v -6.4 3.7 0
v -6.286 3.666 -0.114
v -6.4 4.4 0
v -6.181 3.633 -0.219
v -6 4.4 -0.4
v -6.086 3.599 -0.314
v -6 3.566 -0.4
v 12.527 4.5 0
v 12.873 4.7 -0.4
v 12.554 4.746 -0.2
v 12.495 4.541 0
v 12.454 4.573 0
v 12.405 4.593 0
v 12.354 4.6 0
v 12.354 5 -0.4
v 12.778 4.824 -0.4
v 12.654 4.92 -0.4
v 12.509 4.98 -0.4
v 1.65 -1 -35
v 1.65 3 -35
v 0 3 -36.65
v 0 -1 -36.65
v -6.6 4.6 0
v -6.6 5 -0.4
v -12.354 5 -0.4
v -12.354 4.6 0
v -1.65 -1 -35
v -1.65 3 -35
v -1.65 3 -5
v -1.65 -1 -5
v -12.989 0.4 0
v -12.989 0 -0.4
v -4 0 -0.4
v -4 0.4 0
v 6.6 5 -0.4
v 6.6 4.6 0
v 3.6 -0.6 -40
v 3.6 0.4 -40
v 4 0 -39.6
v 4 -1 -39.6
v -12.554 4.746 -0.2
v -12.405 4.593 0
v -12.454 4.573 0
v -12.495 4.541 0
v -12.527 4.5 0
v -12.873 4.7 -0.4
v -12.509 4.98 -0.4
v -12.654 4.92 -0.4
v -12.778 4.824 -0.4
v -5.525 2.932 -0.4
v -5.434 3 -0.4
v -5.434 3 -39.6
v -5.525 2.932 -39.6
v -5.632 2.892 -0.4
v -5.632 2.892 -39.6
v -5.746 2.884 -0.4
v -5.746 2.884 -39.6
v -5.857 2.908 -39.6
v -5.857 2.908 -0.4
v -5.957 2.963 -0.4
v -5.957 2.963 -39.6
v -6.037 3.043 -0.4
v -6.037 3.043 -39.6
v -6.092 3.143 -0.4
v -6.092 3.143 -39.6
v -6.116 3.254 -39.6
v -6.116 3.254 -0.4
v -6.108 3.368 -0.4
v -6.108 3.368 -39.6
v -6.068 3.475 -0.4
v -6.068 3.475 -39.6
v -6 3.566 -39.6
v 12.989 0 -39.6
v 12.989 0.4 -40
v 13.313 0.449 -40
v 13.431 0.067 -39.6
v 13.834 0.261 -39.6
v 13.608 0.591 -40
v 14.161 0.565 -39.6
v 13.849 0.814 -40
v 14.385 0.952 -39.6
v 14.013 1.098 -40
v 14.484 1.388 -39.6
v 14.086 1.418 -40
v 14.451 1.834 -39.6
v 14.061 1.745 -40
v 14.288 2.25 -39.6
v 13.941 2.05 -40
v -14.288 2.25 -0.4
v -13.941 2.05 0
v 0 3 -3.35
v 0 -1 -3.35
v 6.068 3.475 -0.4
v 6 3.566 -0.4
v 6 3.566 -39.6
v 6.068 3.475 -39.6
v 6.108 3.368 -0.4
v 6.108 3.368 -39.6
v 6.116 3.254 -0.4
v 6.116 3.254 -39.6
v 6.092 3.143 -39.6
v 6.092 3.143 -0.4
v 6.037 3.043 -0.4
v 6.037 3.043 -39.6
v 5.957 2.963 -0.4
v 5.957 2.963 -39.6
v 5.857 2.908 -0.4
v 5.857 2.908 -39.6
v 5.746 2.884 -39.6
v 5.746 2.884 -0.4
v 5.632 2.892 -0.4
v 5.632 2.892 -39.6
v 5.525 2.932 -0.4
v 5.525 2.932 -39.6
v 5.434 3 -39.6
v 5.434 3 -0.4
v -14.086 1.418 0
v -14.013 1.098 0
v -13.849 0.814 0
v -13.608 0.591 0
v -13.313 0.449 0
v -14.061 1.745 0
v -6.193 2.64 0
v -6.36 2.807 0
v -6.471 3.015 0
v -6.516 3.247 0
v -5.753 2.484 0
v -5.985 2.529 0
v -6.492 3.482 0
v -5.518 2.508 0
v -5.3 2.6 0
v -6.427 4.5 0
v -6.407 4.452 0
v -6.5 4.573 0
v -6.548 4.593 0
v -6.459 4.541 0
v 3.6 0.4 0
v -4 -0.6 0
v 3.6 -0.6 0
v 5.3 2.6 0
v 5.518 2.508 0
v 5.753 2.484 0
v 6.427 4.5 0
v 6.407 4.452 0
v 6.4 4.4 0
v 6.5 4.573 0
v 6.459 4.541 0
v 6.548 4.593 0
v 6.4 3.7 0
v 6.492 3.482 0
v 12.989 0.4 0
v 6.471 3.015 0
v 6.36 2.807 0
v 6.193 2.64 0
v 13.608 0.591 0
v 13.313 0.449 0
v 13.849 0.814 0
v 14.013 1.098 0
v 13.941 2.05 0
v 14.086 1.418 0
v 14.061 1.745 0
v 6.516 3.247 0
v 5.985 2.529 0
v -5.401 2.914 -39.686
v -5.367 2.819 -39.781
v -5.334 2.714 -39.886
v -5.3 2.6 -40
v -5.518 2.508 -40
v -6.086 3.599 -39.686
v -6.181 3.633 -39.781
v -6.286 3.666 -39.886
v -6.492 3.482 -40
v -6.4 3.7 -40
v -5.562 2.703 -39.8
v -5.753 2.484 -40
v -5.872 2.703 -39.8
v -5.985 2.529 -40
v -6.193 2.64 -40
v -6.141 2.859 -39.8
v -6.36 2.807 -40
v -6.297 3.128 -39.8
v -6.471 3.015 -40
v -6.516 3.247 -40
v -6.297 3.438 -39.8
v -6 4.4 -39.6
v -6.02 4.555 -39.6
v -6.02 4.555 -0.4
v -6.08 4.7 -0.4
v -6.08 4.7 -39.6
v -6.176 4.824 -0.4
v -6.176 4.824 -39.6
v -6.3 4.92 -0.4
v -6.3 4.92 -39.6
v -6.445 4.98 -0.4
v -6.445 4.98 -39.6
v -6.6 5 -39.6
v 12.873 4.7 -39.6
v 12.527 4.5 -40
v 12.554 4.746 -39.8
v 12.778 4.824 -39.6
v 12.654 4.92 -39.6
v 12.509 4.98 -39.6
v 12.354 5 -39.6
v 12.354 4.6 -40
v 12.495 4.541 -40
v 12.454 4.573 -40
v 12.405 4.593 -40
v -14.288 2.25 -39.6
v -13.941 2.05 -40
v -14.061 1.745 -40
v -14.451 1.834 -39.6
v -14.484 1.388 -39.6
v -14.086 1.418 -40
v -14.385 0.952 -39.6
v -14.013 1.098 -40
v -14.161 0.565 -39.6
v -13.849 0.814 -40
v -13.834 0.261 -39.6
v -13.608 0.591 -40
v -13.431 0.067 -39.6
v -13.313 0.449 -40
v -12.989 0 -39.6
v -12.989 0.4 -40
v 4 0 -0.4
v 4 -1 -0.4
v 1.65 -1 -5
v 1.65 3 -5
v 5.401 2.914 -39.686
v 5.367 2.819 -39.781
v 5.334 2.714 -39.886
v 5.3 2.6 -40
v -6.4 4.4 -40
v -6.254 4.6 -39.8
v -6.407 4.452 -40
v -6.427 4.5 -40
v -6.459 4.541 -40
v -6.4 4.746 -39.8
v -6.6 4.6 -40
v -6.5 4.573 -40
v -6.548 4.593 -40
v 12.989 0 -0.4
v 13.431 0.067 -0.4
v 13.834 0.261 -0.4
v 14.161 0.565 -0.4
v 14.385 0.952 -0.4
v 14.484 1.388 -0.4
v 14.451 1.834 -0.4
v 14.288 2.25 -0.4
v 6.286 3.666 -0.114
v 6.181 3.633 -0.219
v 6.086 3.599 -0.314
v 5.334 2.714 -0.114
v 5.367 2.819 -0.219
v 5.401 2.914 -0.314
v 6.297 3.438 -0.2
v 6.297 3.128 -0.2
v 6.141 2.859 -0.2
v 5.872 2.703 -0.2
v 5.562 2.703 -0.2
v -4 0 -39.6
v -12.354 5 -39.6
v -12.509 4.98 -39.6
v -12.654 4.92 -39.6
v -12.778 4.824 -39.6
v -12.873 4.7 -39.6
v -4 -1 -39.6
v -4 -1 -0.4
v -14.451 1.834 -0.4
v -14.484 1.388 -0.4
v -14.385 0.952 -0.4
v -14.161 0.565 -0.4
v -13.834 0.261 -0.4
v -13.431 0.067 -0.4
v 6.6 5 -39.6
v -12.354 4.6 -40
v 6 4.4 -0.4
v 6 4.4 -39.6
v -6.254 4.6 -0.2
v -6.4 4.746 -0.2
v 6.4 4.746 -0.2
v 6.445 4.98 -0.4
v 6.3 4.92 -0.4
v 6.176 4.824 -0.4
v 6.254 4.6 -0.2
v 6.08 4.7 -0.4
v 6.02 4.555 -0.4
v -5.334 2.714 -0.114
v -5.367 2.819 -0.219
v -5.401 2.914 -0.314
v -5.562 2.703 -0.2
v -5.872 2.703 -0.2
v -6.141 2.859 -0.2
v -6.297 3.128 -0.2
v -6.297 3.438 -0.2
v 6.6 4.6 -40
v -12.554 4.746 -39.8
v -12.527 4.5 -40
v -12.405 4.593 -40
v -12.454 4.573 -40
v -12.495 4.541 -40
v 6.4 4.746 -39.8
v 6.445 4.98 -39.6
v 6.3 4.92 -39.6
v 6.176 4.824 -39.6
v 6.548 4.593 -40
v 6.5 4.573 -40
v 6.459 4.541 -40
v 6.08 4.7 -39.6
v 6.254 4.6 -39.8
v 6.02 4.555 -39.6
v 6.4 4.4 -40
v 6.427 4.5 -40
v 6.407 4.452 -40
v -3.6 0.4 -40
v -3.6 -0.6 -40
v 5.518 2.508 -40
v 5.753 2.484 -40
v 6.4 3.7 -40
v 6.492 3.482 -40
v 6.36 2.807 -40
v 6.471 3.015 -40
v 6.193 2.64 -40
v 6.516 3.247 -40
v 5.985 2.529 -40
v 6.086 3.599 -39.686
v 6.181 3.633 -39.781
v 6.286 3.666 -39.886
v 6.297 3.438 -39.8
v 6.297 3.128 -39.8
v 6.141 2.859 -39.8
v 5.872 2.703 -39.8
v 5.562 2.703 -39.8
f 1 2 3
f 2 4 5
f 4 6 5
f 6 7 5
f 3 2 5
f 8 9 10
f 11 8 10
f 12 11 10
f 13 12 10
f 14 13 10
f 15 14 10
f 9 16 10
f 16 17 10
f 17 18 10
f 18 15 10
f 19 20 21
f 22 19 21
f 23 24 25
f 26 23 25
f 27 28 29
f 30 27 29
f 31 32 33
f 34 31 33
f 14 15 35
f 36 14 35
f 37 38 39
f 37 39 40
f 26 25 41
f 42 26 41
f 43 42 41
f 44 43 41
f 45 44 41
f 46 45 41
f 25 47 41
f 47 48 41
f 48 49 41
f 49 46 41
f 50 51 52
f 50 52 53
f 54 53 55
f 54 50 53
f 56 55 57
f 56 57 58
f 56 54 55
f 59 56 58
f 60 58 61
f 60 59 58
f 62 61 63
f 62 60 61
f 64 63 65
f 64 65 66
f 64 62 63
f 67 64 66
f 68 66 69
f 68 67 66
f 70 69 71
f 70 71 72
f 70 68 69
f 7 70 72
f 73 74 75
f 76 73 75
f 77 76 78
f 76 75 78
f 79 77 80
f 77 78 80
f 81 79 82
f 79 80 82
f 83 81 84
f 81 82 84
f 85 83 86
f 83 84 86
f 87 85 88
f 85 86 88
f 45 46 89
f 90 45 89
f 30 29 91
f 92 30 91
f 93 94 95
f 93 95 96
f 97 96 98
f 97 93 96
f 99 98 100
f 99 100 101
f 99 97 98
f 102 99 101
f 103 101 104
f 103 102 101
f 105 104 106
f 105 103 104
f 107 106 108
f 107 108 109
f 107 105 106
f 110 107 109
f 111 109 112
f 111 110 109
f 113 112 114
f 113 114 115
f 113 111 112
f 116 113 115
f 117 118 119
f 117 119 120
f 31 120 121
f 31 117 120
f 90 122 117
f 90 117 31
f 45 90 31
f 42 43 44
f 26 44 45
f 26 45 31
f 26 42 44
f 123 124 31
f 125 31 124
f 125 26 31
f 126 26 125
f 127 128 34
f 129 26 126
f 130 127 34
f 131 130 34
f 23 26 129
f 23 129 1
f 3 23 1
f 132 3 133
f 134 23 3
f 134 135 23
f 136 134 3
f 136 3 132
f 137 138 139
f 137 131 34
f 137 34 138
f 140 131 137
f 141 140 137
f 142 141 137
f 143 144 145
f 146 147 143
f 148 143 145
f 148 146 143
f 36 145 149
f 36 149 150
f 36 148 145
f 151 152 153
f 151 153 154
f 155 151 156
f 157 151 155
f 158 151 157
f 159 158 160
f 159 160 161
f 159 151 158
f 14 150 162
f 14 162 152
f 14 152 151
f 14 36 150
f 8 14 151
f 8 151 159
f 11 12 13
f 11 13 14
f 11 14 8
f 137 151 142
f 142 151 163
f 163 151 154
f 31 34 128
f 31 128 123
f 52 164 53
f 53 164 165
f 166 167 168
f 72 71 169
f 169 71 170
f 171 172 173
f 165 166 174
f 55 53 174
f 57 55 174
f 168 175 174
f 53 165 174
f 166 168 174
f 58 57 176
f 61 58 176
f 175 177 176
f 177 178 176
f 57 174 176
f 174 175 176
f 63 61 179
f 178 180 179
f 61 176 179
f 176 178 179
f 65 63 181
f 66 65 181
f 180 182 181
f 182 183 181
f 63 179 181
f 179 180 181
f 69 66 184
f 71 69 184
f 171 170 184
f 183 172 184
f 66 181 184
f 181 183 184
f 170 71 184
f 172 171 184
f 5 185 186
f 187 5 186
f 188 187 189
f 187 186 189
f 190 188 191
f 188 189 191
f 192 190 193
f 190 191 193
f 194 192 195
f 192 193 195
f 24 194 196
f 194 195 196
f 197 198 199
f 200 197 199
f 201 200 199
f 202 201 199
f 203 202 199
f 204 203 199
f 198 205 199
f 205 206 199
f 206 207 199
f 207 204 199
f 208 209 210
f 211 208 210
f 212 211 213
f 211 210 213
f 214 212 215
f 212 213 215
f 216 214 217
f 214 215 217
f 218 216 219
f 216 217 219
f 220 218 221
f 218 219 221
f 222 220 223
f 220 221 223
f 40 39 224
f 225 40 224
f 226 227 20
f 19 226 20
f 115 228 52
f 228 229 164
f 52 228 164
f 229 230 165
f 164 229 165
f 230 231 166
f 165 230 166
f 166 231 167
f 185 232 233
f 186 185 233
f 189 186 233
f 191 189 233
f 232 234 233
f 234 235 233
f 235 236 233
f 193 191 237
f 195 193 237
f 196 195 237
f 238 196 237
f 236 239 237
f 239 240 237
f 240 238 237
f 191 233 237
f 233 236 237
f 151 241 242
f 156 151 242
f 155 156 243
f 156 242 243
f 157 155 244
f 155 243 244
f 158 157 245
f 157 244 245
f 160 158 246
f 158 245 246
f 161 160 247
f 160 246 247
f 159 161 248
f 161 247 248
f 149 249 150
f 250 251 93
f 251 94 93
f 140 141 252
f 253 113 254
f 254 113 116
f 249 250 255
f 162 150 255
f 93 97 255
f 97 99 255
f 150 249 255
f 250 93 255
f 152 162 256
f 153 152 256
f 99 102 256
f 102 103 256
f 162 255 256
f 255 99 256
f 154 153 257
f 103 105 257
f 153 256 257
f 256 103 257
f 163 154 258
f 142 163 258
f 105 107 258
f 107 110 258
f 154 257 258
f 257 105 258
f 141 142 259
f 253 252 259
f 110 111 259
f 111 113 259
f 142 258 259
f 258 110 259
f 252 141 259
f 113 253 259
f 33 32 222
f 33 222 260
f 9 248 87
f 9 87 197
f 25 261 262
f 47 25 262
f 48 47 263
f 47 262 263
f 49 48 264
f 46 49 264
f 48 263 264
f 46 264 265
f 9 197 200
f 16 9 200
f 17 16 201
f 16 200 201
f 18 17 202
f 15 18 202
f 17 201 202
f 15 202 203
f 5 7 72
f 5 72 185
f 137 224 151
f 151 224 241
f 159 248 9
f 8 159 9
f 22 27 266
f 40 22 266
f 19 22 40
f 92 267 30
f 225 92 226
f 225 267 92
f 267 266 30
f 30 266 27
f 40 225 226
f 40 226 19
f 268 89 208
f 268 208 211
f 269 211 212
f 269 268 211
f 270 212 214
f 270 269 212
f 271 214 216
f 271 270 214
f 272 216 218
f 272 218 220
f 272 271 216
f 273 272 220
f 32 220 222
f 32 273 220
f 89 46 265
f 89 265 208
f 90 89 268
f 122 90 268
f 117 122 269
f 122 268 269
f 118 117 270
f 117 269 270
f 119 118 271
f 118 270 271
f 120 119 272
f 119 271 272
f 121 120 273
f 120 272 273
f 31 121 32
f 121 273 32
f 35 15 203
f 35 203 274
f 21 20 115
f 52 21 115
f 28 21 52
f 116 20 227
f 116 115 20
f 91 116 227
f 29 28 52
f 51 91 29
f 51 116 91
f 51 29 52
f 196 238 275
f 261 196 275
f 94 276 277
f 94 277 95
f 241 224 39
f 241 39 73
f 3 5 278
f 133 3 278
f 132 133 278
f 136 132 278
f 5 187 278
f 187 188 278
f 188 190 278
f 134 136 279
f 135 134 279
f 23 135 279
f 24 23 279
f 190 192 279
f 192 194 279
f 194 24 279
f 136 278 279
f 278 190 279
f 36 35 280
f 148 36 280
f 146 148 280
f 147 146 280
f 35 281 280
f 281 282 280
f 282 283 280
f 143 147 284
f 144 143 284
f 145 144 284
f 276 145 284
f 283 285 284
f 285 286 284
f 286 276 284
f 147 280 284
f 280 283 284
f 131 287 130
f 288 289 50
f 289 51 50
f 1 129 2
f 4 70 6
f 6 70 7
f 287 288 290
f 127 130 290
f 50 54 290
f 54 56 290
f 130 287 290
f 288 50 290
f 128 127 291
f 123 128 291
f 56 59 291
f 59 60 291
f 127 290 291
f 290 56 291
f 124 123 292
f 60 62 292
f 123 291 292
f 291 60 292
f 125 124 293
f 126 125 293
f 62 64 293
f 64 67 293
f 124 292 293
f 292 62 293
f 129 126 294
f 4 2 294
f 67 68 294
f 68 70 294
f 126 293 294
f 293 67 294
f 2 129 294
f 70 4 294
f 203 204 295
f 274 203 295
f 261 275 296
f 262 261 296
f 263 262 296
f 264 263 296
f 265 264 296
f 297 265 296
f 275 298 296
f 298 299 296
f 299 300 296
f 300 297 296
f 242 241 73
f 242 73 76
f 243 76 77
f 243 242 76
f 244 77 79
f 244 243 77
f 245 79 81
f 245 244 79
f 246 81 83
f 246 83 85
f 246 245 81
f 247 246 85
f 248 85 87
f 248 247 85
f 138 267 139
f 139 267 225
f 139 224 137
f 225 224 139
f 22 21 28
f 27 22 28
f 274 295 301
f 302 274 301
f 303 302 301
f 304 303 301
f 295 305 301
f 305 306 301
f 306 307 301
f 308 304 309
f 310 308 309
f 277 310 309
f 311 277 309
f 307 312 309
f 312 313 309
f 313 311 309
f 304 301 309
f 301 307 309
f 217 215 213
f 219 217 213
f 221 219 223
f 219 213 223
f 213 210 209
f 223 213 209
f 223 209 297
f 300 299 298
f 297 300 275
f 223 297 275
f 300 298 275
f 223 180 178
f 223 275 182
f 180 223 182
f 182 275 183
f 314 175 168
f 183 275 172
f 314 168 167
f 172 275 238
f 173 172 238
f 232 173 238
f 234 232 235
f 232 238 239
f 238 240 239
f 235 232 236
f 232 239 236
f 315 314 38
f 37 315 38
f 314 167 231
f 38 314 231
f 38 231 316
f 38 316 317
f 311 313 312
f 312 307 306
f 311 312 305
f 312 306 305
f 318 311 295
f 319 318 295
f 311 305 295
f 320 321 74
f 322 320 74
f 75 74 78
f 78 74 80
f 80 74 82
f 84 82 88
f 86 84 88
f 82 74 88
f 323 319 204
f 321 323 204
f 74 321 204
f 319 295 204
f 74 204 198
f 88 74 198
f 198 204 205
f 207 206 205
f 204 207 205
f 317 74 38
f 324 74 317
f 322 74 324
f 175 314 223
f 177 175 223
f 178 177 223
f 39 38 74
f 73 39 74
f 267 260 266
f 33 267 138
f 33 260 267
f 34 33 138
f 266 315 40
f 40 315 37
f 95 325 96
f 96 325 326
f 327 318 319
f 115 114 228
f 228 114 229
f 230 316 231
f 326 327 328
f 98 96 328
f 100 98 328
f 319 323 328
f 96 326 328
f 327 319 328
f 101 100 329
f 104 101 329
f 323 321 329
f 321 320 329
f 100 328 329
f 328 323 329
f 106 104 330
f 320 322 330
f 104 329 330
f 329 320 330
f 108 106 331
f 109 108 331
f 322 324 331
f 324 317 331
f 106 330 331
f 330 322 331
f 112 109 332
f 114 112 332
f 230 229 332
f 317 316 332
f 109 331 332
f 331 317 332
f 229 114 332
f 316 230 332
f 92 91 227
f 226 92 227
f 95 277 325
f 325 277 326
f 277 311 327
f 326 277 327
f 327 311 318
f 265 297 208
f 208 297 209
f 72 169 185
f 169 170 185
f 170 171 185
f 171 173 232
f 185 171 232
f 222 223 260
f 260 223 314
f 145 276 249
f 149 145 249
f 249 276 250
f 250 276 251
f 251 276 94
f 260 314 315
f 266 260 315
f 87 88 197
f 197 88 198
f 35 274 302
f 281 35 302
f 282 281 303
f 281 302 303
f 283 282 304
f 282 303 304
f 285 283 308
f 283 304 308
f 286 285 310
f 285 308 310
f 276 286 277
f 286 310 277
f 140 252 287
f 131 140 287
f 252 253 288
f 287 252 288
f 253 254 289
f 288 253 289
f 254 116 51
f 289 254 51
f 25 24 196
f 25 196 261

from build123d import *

# Parameters (mm, degrees)
BOSS_EXTRUDE1_DEPTH = 40
SKETCH2_W           = 8
SKETCH2_H           = 40
BOSS_EXTRUDE2_DEPTH = 1
CUT_EXTRUDE1_DEPTH  = 5
FILLET1_R           = 0.6
CHAMFER1_SIZE       = 0.4


with BuildPart() as part:
    # Sketch1 → Boss-Extrude1 (new body)
    with BuildSketch(Plane.XY):
        with BuildLine():
            Line((-12.988675135, 0), (0, 0))
            Line((0, 0), (12.988675135, 0))
            ThreePointArc((12.988675135, 0), (14.28771324, 0.75), (14.28771324, 2.25))
            Line((14.28771324, 2.25), (12.7, 5))
            Line((12.7, 5), (6, 5))
            Line((6, 5), (6, 3.565685425))
            ThreePointArc((6, 3.565685425), (6, 3), (5.434314575, 3))
            Line((5.434314575, 3), (-5.434314575, 3))
            ThreePointArc((-5.434314575, 3), (-6, 3), (-6, 3.565685425))
            Line((-6, 3.565685425), (-6, 5))
            Line((-6, 5), (-12.7, 5))
            Line((-12.7, 5), (-14.28771324, 2.25))
            ThreePointArc((-14.28771324, 2.25), (-14.28771324, 0.75), (-12.988675135, 0))
        make_face()
    extrude(amount=-BOSS_EXTRUDE1_DEPTH)

    # Sketch2 → Boss-Extrude2 (add)
    with BuildSketch(Plane.XZ):
        with Locations((0, -20)):
            Rectangle(SKETCH2_W, SKETCH2_H)
    extrude(amount=BOSS_EXTRUDE2_DEPTH)

    # Sketch3 → Cut-Extrude1 (cut, through all)
    with BuildSketch(Plane(origin=(0, 3, 0), x_dir=(1, 0, 0), z_dir=(0, 1, 0))):
        Polygon((0, 3.35), (1.65, 5), (1.65, 35), (0, 36.65), (-1.65, 35), (-1.65, 5), align=None)
    extrude(amount=-CUT_EXTRUDE1_DEPTH, mode=Mode.SUBTRACT)

    # Fillet1
    fillet1_edges = [part.edges().sort_by_distance(p)[0] for p in [
        (-12.7, 5, -20),
        (-6, 5, -20),
        (6, 5, -20),
        (12.7, 5, -20),
    ]]
    fillet(fillet1_edges, radius=FILLET1_R)

    # Chamfer1
    chamfer1_edges = [part.edges().sort_by_distance(p)[0] for p in [
        (-6, 3.982842712, 0),
        (-6, 3, 0),
        (0, 3, 0),
        (6, 3, 0),
        (13.580459161, 3.475, 0),
        (14.28771324, 0.75, 0),
        (14.28771324, 0.75, -40),
        (-8.494337567, 0, 0),
        (-14.28771324, 0.75, 0),
        (13.580459161, 3.475, -40),
        (6, 3, -40),
        (0, 3, -40),
        (8.494337567, 0, 0),
        (8.494337567, 0, -40),
        (4, -0.5, 0),
        (-6, 3, -40),
        (-4, -0.5, -40),
        (4, -0.5, -40),
        (0, -1, 0),
        (0, -1, -40),
        (-6, 3.982842712, -40),
        (-14.28771324, 0.75, -40),
        (9.476794919, 5, 0),
        (9.476794919, 5, -40),
        (6, 3.982842712, 0),
        (-9.476794919, 5, 0),
        (-13.580459161, 3.475, 0),
        (-6.175735931, 4.824264069, 0),
        (-12.653589838, 4.919615242, 0),
        (12.653589838, 4.919615242, 0),
        (6.175735931, 4.824264069, 0),
        (6, 3.982842712, -40),
        (-13.580459161, 3.475, -40),
        (-9.476794919, 5, -40),
        (-6.175735931, 4.824264069, -40),
        (-12.653589838, 4.919615242, -40),
        (12.653589838, 4.919615242, -40),
        (6.175735931, 4.824264069, -40),
        (-8.494337567, 0, -40),
    ]]
    chamfer(chamfer1_edges, length=CHAMFER1_SIZE)


solid = part.part
